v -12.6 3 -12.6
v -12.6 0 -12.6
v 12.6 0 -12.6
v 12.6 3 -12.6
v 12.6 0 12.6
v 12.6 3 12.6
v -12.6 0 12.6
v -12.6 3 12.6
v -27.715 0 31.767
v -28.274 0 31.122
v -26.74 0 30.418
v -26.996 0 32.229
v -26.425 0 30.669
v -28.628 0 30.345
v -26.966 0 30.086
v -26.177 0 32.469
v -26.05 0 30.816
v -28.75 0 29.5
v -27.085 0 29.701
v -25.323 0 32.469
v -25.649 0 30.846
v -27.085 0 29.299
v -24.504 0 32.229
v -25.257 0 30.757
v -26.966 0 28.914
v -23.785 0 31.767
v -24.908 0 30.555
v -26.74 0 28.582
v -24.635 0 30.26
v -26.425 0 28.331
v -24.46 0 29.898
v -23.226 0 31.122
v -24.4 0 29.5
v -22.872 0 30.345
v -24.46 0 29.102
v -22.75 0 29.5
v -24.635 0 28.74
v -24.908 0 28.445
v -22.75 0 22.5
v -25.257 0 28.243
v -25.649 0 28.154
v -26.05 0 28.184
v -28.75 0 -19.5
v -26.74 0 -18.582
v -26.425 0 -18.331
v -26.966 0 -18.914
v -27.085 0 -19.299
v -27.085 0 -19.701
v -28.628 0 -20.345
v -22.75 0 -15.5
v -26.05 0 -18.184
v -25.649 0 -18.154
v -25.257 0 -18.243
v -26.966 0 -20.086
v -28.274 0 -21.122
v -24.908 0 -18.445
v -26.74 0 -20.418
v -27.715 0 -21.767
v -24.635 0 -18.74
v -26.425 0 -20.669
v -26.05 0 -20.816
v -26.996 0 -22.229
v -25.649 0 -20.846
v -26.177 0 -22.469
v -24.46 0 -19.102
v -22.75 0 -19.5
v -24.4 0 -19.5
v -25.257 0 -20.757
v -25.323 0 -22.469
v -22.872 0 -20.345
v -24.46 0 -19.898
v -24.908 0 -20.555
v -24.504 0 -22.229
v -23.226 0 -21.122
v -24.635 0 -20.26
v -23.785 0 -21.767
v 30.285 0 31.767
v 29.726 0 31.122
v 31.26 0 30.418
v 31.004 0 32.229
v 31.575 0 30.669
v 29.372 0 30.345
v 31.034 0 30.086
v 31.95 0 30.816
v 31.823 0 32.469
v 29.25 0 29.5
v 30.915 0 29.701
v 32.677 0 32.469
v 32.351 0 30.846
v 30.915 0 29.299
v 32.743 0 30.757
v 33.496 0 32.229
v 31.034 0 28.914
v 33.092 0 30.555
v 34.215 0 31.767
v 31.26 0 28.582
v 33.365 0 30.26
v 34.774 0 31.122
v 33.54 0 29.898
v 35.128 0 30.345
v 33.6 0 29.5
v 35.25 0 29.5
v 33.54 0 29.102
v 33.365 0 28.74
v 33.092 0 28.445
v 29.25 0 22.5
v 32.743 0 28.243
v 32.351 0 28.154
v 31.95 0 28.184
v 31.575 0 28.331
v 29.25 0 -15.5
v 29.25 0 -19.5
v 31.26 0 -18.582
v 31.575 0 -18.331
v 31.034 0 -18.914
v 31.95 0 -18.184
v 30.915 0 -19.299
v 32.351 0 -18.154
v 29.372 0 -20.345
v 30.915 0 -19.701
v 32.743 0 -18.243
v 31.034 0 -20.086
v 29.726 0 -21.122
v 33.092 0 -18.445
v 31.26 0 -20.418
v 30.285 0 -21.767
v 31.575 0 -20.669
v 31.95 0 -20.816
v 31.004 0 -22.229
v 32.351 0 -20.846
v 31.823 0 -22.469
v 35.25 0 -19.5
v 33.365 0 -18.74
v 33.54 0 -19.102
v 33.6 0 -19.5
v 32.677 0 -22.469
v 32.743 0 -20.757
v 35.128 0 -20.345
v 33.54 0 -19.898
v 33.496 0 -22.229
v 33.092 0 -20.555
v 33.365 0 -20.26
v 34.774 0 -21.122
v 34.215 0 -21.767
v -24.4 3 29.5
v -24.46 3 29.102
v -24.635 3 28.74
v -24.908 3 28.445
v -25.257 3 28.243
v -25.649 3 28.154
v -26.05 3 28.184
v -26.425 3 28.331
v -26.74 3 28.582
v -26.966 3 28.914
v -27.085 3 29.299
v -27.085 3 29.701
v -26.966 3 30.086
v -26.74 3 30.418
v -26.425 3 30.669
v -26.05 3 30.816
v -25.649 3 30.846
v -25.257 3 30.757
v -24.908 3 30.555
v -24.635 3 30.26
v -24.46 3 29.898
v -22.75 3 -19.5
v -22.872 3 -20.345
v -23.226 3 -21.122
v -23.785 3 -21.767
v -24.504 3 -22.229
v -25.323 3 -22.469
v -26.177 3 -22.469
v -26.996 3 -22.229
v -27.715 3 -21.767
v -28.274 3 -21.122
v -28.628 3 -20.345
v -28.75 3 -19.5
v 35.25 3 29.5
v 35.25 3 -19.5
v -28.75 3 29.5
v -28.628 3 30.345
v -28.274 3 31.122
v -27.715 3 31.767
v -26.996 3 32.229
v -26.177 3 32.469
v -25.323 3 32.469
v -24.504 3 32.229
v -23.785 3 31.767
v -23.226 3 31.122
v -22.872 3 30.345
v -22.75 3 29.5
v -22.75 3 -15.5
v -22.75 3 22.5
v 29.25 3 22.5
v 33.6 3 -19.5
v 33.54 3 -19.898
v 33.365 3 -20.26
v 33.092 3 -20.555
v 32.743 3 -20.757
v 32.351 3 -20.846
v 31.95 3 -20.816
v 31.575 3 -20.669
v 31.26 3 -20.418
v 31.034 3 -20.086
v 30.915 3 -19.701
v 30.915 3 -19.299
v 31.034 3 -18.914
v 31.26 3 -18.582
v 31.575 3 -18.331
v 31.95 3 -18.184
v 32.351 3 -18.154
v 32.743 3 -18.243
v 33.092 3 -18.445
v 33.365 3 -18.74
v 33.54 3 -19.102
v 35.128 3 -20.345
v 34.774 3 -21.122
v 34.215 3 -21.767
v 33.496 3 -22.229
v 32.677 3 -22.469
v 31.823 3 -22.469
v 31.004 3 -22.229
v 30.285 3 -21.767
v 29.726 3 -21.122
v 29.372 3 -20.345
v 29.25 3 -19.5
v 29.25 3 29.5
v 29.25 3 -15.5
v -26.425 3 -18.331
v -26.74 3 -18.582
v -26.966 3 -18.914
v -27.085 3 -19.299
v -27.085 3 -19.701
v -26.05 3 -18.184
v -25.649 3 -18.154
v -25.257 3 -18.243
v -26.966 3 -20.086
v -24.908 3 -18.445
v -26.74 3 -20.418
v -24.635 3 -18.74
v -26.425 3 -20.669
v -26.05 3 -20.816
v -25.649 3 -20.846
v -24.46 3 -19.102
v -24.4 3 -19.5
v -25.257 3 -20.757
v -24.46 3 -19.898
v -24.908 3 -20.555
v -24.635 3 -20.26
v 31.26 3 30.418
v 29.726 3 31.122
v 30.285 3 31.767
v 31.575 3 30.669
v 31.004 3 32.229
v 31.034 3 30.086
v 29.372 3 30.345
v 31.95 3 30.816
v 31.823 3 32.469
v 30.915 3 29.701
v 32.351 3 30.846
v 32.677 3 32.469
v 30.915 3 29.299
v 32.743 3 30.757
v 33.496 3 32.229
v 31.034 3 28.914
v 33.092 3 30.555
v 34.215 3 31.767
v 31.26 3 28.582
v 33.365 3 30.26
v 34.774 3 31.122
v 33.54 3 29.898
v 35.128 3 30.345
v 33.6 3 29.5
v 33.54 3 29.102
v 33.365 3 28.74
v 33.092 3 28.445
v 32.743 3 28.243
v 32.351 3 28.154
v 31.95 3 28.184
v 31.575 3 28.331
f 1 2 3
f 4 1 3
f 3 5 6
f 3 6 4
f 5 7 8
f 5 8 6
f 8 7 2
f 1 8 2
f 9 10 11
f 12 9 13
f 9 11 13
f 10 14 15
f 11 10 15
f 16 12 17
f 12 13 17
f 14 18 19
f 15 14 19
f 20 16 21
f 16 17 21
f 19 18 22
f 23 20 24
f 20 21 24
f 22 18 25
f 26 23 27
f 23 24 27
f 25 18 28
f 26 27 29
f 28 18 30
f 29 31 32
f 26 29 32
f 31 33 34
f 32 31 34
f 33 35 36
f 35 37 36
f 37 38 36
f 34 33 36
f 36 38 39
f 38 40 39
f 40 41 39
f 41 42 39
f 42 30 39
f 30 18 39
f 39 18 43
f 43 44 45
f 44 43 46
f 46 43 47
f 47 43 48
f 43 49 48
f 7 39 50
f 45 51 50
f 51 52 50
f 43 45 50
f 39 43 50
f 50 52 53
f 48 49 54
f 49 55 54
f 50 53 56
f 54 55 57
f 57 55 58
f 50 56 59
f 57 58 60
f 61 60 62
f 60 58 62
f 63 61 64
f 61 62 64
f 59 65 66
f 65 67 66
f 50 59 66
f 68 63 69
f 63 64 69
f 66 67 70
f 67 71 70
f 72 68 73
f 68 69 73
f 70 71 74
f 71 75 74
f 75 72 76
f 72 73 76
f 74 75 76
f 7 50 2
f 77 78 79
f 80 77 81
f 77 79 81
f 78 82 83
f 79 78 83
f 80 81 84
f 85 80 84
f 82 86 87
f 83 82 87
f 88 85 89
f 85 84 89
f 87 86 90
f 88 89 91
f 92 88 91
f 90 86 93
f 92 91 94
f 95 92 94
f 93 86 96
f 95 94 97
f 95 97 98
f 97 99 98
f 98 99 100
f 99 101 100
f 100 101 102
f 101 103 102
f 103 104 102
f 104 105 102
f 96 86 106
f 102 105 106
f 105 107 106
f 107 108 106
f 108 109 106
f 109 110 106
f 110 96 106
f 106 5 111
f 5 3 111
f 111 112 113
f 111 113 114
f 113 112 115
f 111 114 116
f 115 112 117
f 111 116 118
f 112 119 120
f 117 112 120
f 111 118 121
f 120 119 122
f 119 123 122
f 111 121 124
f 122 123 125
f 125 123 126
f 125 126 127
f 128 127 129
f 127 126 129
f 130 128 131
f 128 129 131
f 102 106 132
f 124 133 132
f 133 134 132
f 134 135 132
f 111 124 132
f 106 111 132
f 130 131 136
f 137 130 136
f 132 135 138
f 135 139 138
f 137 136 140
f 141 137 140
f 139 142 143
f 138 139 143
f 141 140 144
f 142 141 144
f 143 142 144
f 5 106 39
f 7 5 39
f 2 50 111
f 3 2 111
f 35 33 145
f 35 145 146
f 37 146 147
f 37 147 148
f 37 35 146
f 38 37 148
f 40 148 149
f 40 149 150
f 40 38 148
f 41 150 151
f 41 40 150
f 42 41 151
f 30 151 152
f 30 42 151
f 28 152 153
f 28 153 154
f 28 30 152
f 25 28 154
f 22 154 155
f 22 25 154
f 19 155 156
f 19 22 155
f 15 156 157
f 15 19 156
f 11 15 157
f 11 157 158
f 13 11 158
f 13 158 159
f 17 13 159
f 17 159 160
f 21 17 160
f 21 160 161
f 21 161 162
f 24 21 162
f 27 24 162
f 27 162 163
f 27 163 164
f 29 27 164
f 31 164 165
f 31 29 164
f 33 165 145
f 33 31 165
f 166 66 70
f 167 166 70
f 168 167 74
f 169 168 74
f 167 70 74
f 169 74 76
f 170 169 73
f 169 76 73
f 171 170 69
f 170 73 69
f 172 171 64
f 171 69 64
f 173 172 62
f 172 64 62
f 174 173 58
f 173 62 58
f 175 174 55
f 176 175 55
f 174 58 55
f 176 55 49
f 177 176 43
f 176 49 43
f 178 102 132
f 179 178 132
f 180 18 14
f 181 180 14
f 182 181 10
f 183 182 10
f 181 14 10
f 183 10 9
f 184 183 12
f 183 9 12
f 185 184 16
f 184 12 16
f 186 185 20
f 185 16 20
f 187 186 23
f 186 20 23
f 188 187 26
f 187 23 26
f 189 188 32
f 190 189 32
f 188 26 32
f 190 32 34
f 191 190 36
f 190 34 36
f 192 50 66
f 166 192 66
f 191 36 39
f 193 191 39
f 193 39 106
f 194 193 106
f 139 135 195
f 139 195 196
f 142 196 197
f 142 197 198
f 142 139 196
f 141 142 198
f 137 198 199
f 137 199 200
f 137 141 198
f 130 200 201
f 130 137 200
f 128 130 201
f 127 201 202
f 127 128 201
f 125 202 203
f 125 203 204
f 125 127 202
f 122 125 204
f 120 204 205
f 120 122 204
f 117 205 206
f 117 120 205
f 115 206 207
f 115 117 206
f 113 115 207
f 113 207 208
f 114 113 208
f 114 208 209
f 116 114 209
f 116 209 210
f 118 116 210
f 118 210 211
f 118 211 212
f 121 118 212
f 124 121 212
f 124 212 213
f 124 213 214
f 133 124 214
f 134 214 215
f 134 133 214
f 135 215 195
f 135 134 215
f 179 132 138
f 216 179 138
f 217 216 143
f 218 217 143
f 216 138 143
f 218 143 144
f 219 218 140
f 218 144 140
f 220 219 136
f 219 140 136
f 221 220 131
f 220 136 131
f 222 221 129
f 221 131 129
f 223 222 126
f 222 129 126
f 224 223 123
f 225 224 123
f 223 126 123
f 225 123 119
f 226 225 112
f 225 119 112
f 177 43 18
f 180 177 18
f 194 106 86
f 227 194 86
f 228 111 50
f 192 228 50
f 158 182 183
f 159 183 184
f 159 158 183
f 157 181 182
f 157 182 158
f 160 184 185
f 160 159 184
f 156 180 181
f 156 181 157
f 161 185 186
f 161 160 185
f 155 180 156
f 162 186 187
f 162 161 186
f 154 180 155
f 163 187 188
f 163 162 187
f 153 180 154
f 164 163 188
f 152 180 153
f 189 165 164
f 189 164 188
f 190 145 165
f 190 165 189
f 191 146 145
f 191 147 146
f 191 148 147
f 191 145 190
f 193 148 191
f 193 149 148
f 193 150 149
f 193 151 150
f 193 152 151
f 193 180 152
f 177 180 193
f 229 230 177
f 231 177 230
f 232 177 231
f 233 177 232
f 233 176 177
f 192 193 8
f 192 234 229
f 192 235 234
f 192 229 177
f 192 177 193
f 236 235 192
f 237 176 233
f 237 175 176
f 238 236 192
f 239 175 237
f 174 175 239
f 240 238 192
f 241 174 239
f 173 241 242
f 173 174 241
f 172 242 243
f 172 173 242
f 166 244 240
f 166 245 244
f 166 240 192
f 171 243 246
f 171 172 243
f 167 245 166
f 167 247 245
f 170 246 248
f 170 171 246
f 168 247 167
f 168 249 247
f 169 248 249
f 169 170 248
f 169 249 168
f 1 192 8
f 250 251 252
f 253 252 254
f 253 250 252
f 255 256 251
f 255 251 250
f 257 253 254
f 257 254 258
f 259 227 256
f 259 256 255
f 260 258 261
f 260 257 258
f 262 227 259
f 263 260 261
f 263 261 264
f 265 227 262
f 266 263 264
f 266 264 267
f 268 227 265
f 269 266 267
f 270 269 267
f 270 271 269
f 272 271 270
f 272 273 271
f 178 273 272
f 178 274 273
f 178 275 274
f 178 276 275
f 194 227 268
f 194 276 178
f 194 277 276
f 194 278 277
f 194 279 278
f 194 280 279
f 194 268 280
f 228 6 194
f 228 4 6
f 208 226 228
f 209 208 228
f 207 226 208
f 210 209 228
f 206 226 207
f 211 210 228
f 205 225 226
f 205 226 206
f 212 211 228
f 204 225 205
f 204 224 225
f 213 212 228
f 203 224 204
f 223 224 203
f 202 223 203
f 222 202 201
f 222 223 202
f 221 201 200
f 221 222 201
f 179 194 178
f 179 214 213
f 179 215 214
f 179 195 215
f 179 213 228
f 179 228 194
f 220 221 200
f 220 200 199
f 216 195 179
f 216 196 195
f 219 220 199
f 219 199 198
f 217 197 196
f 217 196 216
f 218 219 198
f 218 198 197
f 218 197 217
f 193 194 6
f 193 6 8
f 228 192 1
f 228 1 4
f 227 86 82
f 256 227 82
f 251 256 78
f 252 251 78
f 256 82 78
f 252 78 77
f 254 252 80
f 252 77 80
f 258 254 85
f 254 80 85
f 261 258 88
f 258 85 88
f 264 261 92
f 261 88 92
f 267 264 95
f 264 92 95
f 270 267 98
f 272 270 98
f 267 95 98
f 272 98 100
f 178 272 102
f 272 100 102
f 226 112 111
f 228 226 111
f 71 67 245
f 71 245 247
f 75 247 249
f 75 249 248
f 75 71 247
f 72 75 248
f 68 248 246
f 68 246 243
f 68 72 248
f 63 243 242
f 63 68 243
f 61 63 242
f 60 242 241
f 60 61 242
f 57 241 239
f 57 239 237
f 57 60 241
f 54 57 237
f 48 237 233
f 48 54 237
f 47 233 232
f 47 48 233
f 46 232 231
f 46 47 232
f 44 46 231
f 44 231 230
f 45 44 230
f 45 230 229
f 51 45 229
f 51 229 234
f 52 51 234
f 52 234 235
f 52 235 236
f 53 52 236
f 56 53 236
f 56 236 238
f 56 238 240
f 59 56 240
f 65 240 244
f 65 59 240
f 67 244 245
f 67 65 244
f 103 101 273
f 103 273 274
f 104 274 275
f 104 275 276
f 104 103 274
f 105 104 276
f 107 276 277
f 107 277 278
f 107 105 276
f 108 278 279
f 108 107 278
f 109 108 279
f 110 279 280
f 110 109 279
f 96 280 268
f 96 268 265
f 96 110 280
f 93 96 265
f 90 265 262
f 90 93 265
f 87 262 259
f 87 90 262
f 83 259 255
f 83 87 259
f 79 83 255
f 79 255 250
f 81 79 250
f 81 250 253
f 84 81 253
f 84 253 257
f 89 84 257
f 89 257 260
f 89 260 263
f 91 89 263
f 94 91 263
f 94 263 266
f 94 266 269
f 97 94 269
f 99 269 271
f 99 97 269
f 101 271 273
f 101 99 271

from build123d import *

# Parameters (mm, degrees)
SKETCH_1_R      = 1.35
SKETCH_1_W      = 25.2
SKETCH_1_H      = 25.2
EXTRUDE_1_DEPTH = 3


with BuildPart() as part:
    # 草图1 → 凸台-拉伸1 (new body)
    with BuildSketch(Plane(origin=(0, 0, 0), x_dir=(1, 0, 0), z_dir=(0, 1, 0))):
        with BuildLine():
            Line((-28.75, 19.5), (-28.75, -29.5))
            ThreePointArc((-28.75, -29.5), (-25.75, -32.5), (-22.75, -29.5))
            Line((-22.75, -29.5), (-22.75, -22.5))
            Line((-22.75, -22.5), (29.25, -22.5))
            Line((29.25, -22.5), (29.25, -29.5))
            ThreePointArc((29.25, -29.5), (32.25, -32.5), (35.25, -29.5))
            Line((35.25, -29.5), (35.25, 19.5))
            ThreePointArc((35.25, 19.5), (32.25, 22.5), (29.25, 19.5))
            Line((29.25, 19.5), (29.25, 15.5))
            Line((29.25, 15.5), (-22.75, 15.5))
            Line((-22.75, 15.5), (-22.75, 19.5))
            ThreePointArc((-22.75, 19.5), (-25.75, 22.5), (-28.75, 19.5))
        make_face()
        with Locations((-25.75, 19.5)):
            Circle(SKETCH_1_R, mode=Mode.SUBTRACT)
        with Locations((-25.75, -29.5)):
            Circle(SKETCH_1_R, mode=Mode.SUBTRACT)
        with Locations((32.25, 19.5)):
            Circle(SKETCH_1_R, mode=Mode.SUBTRACT)
        with Locations((32.25, -29.5)):
            Circle(SKETCH_1_R, mode=Mode.SUBTRACT)
        Rectangle(SKETCH_1_W, SKETCH_1_H, mode=Mode.SUBTRACT)
    extrude(amount=EXTRUDE_1_DEPTH)


solid = part.part
